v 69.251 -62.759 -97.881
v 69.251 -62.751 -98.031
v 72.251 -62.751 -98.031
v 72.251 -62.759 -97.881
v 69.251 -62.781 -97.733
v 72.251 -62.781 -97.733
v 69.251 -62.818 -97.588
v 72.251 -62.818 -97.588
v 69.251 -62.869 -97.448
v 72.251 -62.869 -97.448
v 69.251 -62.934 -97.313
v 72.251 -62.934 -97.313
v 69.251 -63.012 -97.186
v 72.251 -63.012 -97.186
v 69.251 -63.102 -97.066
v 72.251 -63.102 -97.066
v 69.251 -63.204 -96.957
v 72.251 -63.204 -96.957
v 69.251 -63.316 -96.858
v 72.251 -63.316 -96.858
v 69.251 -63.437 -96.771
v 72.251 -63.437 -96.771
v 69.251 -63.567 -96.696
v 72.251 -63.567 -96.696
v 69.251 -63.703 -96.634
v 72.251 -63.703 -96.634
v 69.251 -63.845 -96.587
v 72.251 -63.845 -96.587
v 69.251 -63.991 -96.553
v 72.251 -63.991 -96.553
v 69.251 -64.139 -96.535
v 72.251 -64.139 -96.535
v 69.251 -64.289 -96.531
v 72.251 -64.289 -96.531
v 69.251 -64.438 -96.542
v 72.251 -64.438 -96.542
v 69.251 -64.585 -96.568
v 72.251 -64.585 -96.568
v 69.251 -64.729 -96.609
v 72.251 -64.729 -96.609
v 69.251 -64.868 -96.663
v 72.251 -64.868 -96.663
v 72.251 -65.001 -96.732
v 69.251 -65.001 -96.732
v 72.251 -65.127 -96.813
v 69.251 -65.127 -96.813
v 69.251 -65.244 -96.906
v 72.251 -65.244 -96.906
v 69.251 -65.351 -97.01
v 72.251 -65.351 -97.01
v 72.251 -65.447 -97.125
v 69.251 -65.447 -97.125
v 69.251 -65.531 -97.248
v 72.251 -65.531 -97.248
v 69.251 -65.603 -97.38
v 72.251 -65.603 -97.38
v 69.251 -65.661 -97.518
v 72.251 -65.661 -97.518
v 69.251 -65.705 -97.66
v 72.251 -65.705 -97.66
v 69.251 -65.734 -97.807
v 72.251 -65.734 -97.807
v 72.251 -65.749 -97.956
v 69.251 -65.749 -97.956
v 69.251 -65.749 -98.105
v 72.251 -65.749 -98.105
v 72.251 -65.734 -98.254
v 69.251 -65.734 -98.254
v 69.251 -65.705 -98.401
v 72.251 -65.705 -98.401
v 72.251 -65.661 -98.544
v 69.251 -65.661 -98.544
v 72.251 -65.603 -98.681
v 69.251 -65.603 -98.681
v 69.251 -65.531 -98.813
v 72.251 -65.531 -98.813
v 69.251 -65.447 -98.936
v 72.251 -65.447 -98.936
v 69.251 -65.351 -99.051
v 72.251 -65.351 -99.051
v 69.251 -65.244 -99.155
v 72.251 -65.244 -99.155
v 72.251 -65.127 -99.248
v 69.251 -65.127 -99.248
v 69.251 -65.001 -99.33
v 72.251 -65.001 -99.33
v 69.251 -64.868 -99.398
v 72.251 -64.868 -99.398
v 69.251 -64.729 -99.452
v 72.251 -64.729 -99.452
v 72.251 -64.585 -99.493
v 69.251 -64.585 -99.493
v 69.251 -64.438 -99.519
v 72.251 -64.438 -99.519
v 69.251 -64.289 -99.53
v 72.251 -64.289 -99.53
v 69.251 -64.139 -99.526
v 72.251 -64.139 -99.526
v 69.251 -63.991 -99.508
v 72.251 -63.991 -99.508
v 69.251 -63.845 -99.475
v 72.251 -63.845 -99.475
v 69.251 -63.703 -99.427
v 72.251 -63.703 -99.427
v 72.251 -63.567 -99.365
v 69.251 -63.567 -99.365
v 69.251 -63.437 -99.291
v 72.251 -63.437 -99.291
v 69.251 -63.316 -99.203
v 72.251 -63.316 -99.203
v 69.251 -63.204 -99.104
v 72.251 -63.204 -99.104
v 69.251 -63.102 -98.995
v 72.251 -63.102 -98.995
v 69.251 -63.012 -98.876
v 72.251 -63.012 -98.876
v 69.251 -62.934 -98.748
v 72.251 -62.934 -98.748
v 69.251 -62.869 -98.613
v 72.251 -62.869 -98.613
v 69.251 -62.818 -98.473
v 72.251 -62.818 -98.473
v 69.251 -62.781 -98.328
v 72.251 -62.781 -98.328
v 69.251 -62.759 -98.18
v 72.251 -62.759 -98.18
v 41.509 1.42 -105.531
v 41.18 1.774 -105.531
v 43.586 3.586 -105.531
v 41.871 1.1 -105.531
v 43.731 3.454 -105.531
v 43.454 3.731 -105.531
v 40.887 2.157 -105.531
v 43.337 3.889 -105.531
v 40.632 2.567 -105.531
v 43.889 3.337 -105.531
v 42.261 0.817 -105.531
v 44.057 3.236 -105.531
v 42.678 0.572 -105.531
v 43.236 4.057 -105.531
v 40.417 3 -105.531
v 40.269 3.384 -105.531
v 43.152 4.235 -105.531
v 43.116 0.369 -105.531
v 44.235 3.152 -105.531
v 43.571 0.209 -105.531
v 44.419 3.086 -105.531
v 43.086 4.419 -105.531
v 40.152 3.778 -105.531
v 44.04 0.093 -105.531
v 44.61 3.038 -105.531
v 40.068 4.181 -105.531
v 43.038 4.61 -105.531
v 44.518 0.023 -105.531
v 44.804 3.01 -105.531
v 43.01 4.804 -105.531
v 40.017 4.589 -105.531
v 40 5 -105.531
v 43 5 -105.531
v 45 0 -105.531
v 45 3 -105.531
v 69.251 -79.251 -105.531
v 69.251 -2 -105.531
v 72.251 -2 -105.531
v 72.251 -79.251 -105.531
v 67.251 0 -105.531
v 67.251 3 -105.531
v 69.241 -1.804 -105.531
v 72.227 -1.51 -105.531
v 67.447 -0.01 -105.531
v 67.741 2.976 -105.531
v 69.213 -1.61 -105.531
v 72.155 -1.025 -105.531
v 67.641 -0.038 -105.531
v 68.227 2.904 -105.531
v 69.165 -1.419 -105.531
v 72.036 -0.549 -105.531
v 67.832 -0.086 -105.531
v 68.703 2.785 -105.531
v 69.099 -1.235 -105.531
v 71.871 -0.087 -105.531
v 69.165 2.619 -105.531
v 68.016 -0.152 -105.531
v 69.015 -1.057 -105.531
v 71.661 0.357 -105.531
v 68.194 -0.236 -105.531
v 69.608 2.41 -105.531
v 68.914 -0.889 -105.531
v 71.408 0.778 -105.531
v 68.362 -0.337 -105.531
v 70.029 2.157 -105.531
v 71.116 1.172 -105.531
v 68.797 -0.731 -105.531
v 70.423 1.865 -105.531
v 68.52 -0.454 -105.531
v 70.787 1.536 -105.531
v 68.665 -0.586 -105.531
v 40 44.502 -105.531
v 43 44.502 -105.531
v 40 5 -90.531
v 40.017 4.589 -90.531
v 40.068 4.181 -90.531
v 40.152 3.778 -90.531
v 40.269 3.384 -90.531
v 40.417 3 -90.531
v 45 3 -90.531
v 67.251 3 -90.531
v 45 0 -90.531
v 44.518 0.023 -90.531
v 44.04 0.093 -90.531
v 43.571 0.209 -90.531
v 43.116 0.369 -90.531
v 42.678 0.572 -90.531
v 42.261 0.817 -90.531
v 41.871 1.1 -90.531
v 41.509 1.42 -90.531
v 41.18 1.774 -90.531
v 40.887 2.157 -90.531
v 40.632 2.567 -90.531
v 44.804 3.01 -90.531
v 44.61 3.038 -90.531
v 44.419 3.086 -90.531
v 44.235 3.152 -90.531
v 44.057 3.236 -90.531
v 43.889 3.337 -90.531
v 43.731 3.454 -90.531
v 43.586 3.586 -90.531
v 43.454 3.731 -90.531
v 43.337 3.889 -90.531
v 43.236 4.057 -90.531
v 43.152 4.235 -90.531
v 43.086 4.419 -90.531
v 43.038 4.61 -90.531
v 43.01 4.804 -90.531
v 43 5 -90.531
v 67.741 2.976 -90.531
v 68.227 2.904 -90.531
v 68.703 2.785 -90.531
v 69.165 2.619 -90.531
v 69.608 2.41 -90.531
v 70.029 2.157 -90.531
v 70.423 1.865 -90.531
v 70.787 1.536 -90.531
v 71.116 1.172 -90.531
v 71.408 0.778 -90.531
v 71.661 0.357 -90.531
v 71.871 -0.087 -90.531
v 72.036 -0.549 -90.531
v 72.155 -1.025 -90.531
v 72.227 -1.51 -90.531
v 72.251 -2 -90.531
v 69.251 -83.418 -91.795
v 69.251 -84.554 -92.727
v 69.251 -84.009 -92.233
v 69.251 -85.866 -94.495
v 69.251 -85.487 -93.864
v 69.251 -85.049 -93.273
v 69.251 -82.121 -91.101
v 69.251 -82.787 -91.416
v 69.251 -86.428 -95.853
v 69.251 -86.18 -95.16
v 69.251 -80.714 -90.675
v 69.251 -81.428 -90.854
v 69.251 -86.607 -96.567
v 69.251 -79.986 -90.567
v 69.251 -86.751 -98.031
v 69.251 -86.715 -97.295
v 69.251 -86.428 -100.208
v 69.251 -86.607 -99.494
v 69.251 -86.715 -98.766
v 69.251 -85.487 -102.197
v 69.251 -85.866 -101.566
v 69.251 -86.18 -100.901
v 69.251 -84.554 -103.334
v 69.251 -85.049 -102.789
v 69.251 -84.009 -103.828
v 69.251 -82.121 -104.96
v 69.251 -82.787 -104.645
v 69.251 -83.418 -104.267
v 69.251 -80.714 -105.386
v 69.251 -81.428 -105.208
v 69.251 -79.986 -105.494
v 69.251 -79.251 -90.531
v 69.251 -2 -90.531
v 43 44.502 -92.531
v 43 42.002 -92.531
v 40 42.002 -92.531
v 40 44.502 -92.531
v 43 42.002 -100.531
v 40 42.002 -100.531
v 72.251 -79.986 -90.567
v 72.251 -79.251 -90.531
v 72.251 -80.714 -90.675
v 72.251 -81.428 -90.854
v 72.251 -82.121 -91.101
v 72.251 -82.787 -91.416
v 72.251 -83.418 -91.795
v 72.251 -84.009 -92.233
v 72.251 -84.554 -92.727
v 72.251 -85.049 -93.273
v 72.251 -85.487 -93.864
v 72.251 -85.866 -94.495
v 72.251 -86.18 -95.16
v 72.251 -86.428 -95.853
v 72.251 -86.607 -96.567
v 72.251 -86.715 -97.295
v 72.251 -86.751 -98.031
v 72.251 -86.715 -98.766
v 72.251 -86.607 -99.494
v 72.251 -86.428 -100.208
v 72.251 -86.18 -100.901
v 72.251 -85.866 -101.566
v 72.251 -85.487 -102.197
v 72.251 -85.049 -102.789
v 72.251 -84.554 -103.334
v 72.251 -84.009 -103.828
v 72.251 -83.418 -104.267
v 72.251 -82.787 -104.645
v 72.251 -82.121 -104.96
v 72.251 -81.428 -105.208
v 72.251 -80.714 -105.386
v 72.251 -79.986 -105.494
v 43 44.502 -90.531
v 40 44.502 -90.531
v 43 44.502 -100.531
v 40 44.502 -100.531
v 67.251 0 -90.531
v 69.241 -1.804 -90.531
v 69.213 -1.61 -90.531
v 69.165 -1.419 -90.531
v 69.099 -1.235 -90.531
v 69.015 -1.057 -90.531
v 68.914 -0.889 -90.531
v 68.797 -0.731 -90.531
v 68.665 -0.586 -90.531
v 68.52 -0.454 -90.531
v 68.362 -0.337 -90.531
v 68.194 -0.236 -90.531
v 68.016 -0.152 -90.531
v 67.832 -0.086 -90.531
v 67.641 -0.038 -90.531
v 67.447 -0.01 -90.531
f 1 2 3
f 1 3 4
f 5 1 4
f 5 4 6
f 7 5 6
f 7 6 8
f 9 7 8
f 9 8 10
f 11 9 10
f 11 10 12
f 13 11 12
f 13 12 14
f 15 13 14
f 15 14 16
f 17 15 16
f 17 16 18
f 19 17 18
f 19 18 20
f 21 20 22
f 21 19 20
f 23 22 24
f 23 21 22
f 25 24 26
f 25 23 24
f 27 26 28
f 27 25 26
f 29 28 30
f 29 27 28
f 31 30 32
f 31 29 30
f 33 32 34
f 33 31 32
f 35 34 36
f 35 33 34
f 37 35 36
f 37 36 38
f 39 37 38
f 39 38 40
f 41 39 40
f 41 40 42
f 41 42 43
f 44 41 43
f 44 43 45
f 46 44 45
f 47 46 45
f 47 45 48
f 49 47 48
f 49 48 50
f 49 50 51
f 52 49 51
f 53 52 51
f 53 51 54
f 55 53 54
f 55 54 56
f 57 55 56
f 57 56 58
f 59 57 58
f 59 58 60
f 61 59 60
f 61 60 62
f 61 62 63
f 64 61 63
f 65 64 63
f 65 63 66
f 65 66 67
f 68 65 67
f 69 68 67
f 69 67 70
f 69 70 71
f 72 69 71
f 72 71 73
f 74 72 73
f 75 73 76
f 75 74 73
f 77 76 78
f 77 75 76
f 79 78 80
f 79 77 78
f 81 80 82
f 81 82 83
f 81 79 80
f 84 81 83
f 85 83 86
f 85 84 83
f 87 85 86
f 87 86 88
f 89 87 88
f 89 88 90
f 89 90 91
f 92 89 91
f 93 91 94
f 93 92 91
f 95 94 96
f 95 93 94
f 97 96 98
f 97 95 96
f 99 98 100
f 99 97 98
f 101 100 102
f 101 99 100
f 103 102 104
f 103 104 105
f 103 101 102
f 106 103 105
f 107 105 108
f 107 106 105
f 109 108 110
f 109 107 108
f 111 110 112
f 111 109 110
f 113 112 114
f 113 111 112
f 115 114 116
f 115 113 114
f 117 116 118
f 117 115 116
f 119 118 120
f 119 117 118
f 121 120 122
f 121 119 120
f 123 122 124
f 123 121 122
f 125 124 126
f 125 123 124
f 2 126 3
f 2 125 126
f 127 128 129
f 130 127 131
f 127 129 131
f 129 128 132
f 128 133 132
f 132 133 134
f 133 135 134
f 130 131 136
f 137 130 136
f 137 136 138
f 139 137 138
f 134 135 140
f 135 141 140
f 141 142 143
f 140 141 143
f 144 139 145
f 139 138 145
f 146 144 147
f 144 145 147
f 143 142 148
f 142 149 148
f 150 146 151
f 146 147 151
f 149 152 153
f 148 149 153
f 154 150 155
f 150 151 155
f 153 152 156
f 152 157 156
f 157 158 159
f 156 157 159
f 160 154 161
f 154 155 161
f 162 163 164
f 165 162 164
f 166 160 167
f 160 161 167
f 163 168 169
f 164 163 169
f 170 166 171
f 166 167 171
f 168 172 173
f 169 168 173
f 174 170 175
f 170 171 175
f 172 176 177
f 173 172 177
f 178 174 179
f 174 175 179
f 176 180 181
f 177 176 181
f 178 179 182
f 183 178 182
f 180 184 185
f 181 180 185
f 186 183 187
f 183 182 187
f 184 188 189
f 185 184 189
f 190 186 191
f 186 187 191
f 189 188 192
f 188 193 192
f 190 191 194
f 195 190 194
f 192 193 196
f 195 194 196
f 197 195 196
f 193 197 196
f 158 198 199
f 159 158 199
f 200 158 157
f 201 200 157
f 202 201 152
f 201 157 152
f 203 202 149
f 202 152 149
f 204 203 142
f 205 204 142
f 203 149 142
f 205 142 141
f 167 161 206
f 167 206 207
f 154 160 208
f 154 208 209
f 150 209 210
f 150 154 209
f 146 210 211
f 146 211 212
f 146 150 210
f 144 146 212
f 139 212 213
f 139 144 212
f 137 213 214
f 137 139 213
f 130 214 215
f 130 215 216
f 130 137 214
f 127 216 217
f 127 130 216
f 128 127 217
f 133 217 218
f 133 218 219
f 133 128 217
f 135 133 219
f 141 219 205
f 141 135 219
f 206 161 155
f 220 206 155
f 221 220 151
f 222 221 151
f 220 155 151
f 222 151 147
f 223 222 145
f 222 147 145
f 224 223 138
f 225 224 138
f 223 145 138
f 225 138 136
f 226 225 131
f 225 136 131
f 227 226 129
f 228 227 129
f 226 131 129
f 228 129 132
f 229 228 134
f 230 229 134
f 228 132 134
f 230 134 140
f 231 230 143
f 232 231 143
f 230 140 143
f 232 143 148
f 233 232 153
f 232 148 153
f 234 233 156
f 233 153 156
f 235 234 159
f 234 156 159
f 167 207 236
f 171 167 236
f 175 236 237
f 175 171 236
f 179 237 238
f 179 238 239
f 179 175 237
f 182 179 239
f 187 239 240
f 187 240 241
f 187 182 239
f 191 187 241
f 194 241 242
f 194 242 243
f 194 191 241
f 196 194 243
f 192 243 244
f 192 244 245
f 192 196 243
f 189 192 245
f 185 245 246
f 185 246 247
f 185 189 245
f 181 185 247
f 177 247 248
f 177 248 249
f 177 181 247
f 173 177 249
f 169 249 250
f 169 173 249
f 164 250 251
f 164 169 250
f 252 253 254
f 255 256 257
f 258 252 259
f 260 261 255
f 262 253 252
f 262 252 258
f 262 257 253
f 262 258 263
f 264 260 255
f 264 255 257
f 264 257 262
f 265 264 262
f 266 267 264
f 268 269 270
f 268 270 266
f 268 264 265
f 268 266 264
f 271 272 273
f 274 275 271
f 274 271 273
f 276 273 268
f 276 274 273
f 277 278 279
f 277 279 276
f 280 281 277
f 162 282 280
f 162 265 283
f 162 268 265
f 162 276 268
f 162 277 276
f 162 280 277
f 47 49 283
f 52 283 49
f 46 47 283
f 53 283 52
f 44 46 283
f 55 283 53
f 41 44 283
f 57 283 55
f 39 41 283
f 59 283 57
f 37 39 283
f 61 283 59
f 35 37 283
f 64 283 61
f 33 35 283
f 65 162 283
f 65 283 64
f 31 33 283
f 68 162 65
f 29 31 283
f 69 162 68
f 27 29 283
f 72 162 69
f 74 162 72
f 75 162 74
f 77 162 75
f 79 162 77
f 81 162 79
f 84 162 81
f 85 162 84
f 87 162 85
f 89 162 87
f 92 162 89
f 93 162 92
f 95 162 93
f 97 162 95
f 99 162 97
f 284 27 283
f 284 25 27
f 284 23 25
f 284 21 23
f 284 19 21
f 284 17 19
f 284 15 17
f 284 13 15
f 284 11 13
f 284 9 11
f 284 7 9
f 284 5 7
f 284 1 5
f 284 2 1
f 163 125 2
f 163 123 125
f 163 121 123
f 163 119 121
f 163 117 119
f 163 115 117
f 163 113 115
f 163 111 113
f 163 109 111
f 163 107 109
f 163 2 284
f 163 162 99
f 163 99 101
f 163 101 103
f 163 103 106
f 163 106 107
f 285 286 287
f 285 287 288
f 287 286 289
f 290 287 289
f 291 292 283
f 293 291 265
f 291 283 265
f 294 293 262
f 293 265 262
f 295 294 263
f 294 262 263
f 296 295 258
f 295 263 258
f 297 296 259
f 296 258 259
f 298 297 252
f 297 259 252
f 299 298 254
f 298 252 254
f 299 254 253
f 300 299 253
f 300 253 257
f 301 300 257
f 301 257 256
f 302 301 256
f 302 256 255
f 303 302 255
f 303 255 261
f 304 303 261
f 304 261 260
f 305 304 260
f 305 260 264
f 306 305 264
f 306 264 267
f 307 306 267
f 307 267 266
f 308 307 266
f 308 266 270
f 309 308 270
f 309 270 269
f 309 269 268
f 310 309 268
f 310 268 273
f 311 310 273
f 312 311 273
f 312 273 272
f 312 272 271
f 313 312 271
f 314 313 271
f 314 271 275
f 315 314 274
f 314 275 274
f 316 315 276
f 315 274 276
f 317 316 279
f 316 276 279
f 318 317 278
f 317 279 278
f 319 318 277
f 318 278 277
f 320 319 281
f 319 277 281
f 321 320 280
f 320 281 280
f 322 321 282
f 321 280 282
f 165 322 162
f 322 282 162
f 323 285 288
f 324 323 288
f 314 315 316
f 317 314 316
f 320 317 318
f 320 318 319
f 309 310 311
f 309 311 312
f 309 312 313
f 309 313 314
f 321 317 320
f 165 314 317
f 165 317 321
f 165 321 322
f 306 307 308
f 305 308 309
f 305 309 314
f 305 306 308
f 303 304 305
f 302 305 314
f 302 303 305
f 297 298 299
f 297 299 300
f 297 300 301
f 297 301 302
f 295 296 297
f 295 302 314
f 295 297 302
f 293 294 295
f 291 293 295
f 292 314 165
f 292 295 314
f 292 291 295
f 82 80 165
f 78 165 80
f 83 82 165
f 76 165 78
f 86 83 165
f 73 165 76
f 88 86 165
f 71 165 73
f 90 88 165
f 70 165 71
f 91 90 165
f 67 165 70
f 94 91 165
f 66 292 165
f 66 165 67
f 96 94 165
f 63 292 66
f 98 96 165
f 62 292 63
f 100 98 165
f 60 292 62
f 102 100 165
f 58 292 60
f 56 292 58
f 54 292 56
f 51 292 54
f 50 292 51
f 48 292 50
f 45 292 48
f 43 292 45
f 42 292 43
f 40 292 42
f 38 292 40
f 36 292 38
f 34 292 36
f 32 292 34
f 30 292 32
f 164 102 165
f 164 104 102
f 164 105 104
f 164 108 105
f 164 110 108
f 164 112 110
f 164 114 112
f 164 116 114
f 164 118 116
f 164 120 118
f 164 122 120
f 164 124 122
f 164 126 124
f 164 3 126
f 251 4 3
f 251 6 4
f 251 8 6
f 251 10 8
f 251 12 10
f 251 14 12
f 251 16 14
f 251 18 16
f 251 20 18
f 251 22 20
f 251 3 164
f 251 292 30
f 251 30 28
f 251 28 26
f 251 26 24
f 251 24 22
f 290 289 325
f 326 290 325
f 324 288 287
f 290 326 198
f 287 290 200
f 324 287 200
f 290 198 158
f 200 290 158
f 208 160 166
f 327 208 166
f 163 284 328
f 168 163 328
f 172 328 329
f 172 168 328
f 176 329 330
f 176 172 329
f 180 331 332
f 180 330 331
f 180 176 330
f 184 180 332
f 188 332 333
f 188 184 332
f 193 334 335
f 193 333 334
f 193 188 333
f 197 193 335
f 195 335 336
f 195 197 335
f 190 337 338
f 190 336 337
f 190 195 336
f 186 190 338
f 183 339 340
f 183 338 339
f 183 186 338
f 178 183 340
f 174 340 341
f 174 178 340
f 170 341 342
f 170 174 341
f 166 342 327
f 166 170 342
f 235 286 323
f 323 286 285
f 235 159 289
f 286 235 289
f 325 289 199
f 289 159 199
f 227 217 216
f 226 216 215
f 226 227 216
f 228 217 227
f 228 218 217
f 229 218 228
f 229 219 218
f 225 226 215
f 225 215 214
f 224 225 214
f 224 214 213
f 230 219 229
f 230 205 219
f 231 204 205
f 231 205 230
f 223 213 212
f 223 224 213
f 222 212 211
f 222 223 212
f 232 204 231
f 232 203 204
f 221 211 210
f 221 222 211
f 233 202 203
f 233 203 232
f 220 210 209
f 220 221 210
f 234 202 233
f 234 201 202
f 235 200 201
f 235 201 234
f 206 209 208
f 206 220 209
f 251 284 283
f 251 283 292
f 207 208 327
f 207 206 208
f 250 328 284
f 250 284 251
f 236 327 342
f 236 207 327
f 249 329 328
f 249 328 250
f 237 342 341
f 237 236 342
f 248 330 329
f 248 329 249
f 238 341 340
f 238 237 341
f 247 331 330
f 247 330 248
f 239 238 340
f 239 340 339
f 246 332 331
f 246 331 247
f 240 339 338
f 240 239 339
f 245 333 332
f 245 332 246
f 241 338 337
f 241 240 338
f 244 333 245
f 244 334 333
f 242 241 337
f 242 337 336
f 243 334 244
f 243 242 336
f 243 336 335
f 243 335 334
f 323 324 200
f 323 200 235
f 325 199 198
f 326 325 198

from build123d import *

# Parameters (mm, degrees)
BOSS_EXTRUDE2_DEPTH        = 3
SKETCH5_R                  = 1.5
CUT_EXTRUDE3_DEPTH         = 3
SKETCHED_START             = 72.251106428
SKETCHED_BEND2_OUTLINE_W   = 3
SKETCHED_BEND2_OUTLINE_H   = 15
SKETCHED_BEND2_DEPTH       = 85.748893572
SKETCHED_START_2           = 69.251106428
SKETCHED_BEND2_2_OUTLINE_R = 1.5
SKETCHED_BEND2_2_DEPTH     = 2.5137
SKETCHED_START_3           = 67.251106428
SKETCHED_BEND2_3_OUTLINE_R = 1.5
SKETCHED_BEND2_3_DEPTH     = 5
SKETCHED_START_4           = -107
SKETCHED_BEND2_4_DEPTH     = 17
SKETCHED_START_5           = -105.530592626
SKETCHED_BEND3_DEPTH       = 15
SKETCHED_BEND3_2_DEPTH     = 15
SKETCH26_W                 = 8
SKETCH26_H                 = 2.5
CUT_EXTRUDE8_DEPTH         = 10


with BuildPart() as part:
    # Sketch1 → Boss-Extrude2 (new body)
    with BuildSketch(Plane(origin=(0, 0, 0), x_dir=(1, 0, 0), z_dir=(0, 1, 0))):
        with BuildLine():
            Line((150, 105.530592626), (0, 105.530592626))
            Line((0, 105.530592626), (0, 90.530592626))
            Line((0, 90.530592626), (103.25004789, 90.530592626))
            Line((103.25004789, 90.530592626), (150, 90.530592626))
            ThreePointArc((150, 90.530592626), (157.5, 98.030592626), (150, 105.530592626))
        make_face()
    extrude(amount=BOSS_EXTRUDE2_DEPTH)

    # Sketch5 → Cut-Extrude3 (cut)
    with BuildSketch(Plane(origin=(0, 3, 0), x_dir=(1, 0, 0), z_dir=(0, 1, 0))):
        with Locations(Location((135, 98.030592626, 0), (0, 0, 270))):
            Circle(SKETCH5_R)
    extrude(amount=-CUT_EXTRUDE3_DEPTH, mode=Mode.SUBTRACT)

    # Sketched Bend2: read off the stored shape, not the designer's step
    # Sketched Bend2 outline → Sketched Bend2 (cut)
    with BuildSketch(Plane.YZ.offset(SKETCHED_START)):
        with Locations((1.5, -98.030592626)):
            Rectangle(SKETCHED_BEND2_OUTLINE_W, SKETCHED_BEND2_OUTLINE_H)
    extrude(amount=SKETCHED_BEND2_DEPTH, mode=Mode.SUBTRACT)

    # Sketched Bend2 2 outline → Sketched Bend2 2 (add)
    with BuildSketch(Plane.YZ.offset(SKETCHED_START_2)):
        with BuildLine():
            Line((0, -90.530592626), (-79.251106428, -90.530592626))
            ThreePointArc((-79.251106428, -90.530592626), (-86.751106428, -98.030592626), (-79.251106428, -105.530592626))
            Line((-79.251106428, -105.530592626), (0, -105.530592626))
            Line((0, -105.530592626), (0, -90.530592626))
        make_face()
        with Locations((-64.251106428, -98.030592626)):
            Circle(SKETCHED_BEND2_2_OUTLINE_R, mode=Mode.SUBTRACT)
    extrude(amount=SKETCHED_BEND2_2_DEPTH)

    # Sketched Bend2 3 outline → Sketched Bend2 3 (add)
    with BuildSketch(Plane.YZ.offset(SKETCHED_START_3)):
        with BuildLine():
            Line((0, -90.530592626), (-79.251106428, -90.530592626))
            ThreePointArc((-79.251106428, -90.530592626), (-86.751106428, -98.030592626), (-79.251106428, -105.530592626))
            Line((-79.251106428, -105.530592626), (0, -105.530592626))
            Line((0, -105.530592626), (0, -90.530592626))
        make_face()
        with Locations((-64.251106428, -98.030592626)):
            Circle(SKETCHED_BEND2_3_OUTLINE_R, mode=Mode.SUBTRACT)
    extrude(amount=SKETCHED_BEND2_3_DEPTH)

    # Sketched Bend2 4 outline → Sketched Bend2 4 (cut)
    with BuildSketch(Plane.XY.offset(SKETCHED_START_4)):
        with BuildLine():
            Line((69.251106428, -88), (69.251106428, -2))
            ThreePointArc((69.251106428, -2), (68.66531999, -0.585786438), (67.251106428, 0))
            Line((67.251106428, 0), (67.251106428, -88))
            Line((67.251106428, -88), (69.251106428, -88))
        make_face()
        with BuildLine():
            Line((72.251106428, -2), (72.251106424, -88))
            Line((72.251106424, -88), (74, -88))
            Line((74, -88), (74, 4))
            Line((74, 4), (66, 4))
            Line((66, 4), (66, 3))
            Line((66, 3), (67.251106428, 3))
            ThreePointArc((67.251106428, 3), (70.786640334, 1.535533906), (72.251106428, -2))
        make_face()
    extrude(amount=SKETCHED_BEND2_4_DEPTH, mode=Mode.SUBTRACT)

    # Sketched Bend3: read off the stored shape, not the designer's step
    # Sketched Bend3 outline → Sketched Bend3 (cut)
    with BuildSketch(Plane.XY.offset(SKETCHED_START_5)):
        with BuildLine():
            ThreePointArc((45, 0), (42.261387212, 0.816699867), (40.417424305, 3))
            Line((40.417424305, 3), (0, 3))
            Line((0, 3), (0, 0))
            Line((0, 0), (45, 0))
        make_face()
    extrude(amount=SKETCHED_BEND3_DEPTH, mode=Mode.SUBTRACT)

    # Sketched Bend3 2 outline → Sketched Bend3 2 (add)
    with BuildSketch(Plane.XY.offset(SKETCHED_START_5)):
        with BuildLine():
            ThreePointArc((45, 3), (43.585786438, 3.585786438), (43, 5))
            Line((43, 5), (43, 44.502212856))
            Line((43, 44.502212856), (40, 44.502212856))
            Line((40, 44.502212856), (40, 5))
            ThreePointArc((40, 5), (40.105468435, 3.978451782), (40.417424305, 3))
            Line((40.417424305, 3), (45, 3))
        make_face()
    extrude(amount=SKETCHED_BEND3_2_DEPTH)

    # Sketch26 → Cut-Extrude8 (cut)
    with BuildSketch(Plane(origin=(43, 0, 0), x_dir=(0, 0, -1), z_dir=(1, 0, 0))):
        with Locations((96.530592626, 43.252212856)):
            Rectangle(SKETCH26_W, SKETCH26_H)
    extrude(amount=-CUT_EXTRUDE8_DEPTH, mode=Mode.SUBTRACT)


solid = part.part
